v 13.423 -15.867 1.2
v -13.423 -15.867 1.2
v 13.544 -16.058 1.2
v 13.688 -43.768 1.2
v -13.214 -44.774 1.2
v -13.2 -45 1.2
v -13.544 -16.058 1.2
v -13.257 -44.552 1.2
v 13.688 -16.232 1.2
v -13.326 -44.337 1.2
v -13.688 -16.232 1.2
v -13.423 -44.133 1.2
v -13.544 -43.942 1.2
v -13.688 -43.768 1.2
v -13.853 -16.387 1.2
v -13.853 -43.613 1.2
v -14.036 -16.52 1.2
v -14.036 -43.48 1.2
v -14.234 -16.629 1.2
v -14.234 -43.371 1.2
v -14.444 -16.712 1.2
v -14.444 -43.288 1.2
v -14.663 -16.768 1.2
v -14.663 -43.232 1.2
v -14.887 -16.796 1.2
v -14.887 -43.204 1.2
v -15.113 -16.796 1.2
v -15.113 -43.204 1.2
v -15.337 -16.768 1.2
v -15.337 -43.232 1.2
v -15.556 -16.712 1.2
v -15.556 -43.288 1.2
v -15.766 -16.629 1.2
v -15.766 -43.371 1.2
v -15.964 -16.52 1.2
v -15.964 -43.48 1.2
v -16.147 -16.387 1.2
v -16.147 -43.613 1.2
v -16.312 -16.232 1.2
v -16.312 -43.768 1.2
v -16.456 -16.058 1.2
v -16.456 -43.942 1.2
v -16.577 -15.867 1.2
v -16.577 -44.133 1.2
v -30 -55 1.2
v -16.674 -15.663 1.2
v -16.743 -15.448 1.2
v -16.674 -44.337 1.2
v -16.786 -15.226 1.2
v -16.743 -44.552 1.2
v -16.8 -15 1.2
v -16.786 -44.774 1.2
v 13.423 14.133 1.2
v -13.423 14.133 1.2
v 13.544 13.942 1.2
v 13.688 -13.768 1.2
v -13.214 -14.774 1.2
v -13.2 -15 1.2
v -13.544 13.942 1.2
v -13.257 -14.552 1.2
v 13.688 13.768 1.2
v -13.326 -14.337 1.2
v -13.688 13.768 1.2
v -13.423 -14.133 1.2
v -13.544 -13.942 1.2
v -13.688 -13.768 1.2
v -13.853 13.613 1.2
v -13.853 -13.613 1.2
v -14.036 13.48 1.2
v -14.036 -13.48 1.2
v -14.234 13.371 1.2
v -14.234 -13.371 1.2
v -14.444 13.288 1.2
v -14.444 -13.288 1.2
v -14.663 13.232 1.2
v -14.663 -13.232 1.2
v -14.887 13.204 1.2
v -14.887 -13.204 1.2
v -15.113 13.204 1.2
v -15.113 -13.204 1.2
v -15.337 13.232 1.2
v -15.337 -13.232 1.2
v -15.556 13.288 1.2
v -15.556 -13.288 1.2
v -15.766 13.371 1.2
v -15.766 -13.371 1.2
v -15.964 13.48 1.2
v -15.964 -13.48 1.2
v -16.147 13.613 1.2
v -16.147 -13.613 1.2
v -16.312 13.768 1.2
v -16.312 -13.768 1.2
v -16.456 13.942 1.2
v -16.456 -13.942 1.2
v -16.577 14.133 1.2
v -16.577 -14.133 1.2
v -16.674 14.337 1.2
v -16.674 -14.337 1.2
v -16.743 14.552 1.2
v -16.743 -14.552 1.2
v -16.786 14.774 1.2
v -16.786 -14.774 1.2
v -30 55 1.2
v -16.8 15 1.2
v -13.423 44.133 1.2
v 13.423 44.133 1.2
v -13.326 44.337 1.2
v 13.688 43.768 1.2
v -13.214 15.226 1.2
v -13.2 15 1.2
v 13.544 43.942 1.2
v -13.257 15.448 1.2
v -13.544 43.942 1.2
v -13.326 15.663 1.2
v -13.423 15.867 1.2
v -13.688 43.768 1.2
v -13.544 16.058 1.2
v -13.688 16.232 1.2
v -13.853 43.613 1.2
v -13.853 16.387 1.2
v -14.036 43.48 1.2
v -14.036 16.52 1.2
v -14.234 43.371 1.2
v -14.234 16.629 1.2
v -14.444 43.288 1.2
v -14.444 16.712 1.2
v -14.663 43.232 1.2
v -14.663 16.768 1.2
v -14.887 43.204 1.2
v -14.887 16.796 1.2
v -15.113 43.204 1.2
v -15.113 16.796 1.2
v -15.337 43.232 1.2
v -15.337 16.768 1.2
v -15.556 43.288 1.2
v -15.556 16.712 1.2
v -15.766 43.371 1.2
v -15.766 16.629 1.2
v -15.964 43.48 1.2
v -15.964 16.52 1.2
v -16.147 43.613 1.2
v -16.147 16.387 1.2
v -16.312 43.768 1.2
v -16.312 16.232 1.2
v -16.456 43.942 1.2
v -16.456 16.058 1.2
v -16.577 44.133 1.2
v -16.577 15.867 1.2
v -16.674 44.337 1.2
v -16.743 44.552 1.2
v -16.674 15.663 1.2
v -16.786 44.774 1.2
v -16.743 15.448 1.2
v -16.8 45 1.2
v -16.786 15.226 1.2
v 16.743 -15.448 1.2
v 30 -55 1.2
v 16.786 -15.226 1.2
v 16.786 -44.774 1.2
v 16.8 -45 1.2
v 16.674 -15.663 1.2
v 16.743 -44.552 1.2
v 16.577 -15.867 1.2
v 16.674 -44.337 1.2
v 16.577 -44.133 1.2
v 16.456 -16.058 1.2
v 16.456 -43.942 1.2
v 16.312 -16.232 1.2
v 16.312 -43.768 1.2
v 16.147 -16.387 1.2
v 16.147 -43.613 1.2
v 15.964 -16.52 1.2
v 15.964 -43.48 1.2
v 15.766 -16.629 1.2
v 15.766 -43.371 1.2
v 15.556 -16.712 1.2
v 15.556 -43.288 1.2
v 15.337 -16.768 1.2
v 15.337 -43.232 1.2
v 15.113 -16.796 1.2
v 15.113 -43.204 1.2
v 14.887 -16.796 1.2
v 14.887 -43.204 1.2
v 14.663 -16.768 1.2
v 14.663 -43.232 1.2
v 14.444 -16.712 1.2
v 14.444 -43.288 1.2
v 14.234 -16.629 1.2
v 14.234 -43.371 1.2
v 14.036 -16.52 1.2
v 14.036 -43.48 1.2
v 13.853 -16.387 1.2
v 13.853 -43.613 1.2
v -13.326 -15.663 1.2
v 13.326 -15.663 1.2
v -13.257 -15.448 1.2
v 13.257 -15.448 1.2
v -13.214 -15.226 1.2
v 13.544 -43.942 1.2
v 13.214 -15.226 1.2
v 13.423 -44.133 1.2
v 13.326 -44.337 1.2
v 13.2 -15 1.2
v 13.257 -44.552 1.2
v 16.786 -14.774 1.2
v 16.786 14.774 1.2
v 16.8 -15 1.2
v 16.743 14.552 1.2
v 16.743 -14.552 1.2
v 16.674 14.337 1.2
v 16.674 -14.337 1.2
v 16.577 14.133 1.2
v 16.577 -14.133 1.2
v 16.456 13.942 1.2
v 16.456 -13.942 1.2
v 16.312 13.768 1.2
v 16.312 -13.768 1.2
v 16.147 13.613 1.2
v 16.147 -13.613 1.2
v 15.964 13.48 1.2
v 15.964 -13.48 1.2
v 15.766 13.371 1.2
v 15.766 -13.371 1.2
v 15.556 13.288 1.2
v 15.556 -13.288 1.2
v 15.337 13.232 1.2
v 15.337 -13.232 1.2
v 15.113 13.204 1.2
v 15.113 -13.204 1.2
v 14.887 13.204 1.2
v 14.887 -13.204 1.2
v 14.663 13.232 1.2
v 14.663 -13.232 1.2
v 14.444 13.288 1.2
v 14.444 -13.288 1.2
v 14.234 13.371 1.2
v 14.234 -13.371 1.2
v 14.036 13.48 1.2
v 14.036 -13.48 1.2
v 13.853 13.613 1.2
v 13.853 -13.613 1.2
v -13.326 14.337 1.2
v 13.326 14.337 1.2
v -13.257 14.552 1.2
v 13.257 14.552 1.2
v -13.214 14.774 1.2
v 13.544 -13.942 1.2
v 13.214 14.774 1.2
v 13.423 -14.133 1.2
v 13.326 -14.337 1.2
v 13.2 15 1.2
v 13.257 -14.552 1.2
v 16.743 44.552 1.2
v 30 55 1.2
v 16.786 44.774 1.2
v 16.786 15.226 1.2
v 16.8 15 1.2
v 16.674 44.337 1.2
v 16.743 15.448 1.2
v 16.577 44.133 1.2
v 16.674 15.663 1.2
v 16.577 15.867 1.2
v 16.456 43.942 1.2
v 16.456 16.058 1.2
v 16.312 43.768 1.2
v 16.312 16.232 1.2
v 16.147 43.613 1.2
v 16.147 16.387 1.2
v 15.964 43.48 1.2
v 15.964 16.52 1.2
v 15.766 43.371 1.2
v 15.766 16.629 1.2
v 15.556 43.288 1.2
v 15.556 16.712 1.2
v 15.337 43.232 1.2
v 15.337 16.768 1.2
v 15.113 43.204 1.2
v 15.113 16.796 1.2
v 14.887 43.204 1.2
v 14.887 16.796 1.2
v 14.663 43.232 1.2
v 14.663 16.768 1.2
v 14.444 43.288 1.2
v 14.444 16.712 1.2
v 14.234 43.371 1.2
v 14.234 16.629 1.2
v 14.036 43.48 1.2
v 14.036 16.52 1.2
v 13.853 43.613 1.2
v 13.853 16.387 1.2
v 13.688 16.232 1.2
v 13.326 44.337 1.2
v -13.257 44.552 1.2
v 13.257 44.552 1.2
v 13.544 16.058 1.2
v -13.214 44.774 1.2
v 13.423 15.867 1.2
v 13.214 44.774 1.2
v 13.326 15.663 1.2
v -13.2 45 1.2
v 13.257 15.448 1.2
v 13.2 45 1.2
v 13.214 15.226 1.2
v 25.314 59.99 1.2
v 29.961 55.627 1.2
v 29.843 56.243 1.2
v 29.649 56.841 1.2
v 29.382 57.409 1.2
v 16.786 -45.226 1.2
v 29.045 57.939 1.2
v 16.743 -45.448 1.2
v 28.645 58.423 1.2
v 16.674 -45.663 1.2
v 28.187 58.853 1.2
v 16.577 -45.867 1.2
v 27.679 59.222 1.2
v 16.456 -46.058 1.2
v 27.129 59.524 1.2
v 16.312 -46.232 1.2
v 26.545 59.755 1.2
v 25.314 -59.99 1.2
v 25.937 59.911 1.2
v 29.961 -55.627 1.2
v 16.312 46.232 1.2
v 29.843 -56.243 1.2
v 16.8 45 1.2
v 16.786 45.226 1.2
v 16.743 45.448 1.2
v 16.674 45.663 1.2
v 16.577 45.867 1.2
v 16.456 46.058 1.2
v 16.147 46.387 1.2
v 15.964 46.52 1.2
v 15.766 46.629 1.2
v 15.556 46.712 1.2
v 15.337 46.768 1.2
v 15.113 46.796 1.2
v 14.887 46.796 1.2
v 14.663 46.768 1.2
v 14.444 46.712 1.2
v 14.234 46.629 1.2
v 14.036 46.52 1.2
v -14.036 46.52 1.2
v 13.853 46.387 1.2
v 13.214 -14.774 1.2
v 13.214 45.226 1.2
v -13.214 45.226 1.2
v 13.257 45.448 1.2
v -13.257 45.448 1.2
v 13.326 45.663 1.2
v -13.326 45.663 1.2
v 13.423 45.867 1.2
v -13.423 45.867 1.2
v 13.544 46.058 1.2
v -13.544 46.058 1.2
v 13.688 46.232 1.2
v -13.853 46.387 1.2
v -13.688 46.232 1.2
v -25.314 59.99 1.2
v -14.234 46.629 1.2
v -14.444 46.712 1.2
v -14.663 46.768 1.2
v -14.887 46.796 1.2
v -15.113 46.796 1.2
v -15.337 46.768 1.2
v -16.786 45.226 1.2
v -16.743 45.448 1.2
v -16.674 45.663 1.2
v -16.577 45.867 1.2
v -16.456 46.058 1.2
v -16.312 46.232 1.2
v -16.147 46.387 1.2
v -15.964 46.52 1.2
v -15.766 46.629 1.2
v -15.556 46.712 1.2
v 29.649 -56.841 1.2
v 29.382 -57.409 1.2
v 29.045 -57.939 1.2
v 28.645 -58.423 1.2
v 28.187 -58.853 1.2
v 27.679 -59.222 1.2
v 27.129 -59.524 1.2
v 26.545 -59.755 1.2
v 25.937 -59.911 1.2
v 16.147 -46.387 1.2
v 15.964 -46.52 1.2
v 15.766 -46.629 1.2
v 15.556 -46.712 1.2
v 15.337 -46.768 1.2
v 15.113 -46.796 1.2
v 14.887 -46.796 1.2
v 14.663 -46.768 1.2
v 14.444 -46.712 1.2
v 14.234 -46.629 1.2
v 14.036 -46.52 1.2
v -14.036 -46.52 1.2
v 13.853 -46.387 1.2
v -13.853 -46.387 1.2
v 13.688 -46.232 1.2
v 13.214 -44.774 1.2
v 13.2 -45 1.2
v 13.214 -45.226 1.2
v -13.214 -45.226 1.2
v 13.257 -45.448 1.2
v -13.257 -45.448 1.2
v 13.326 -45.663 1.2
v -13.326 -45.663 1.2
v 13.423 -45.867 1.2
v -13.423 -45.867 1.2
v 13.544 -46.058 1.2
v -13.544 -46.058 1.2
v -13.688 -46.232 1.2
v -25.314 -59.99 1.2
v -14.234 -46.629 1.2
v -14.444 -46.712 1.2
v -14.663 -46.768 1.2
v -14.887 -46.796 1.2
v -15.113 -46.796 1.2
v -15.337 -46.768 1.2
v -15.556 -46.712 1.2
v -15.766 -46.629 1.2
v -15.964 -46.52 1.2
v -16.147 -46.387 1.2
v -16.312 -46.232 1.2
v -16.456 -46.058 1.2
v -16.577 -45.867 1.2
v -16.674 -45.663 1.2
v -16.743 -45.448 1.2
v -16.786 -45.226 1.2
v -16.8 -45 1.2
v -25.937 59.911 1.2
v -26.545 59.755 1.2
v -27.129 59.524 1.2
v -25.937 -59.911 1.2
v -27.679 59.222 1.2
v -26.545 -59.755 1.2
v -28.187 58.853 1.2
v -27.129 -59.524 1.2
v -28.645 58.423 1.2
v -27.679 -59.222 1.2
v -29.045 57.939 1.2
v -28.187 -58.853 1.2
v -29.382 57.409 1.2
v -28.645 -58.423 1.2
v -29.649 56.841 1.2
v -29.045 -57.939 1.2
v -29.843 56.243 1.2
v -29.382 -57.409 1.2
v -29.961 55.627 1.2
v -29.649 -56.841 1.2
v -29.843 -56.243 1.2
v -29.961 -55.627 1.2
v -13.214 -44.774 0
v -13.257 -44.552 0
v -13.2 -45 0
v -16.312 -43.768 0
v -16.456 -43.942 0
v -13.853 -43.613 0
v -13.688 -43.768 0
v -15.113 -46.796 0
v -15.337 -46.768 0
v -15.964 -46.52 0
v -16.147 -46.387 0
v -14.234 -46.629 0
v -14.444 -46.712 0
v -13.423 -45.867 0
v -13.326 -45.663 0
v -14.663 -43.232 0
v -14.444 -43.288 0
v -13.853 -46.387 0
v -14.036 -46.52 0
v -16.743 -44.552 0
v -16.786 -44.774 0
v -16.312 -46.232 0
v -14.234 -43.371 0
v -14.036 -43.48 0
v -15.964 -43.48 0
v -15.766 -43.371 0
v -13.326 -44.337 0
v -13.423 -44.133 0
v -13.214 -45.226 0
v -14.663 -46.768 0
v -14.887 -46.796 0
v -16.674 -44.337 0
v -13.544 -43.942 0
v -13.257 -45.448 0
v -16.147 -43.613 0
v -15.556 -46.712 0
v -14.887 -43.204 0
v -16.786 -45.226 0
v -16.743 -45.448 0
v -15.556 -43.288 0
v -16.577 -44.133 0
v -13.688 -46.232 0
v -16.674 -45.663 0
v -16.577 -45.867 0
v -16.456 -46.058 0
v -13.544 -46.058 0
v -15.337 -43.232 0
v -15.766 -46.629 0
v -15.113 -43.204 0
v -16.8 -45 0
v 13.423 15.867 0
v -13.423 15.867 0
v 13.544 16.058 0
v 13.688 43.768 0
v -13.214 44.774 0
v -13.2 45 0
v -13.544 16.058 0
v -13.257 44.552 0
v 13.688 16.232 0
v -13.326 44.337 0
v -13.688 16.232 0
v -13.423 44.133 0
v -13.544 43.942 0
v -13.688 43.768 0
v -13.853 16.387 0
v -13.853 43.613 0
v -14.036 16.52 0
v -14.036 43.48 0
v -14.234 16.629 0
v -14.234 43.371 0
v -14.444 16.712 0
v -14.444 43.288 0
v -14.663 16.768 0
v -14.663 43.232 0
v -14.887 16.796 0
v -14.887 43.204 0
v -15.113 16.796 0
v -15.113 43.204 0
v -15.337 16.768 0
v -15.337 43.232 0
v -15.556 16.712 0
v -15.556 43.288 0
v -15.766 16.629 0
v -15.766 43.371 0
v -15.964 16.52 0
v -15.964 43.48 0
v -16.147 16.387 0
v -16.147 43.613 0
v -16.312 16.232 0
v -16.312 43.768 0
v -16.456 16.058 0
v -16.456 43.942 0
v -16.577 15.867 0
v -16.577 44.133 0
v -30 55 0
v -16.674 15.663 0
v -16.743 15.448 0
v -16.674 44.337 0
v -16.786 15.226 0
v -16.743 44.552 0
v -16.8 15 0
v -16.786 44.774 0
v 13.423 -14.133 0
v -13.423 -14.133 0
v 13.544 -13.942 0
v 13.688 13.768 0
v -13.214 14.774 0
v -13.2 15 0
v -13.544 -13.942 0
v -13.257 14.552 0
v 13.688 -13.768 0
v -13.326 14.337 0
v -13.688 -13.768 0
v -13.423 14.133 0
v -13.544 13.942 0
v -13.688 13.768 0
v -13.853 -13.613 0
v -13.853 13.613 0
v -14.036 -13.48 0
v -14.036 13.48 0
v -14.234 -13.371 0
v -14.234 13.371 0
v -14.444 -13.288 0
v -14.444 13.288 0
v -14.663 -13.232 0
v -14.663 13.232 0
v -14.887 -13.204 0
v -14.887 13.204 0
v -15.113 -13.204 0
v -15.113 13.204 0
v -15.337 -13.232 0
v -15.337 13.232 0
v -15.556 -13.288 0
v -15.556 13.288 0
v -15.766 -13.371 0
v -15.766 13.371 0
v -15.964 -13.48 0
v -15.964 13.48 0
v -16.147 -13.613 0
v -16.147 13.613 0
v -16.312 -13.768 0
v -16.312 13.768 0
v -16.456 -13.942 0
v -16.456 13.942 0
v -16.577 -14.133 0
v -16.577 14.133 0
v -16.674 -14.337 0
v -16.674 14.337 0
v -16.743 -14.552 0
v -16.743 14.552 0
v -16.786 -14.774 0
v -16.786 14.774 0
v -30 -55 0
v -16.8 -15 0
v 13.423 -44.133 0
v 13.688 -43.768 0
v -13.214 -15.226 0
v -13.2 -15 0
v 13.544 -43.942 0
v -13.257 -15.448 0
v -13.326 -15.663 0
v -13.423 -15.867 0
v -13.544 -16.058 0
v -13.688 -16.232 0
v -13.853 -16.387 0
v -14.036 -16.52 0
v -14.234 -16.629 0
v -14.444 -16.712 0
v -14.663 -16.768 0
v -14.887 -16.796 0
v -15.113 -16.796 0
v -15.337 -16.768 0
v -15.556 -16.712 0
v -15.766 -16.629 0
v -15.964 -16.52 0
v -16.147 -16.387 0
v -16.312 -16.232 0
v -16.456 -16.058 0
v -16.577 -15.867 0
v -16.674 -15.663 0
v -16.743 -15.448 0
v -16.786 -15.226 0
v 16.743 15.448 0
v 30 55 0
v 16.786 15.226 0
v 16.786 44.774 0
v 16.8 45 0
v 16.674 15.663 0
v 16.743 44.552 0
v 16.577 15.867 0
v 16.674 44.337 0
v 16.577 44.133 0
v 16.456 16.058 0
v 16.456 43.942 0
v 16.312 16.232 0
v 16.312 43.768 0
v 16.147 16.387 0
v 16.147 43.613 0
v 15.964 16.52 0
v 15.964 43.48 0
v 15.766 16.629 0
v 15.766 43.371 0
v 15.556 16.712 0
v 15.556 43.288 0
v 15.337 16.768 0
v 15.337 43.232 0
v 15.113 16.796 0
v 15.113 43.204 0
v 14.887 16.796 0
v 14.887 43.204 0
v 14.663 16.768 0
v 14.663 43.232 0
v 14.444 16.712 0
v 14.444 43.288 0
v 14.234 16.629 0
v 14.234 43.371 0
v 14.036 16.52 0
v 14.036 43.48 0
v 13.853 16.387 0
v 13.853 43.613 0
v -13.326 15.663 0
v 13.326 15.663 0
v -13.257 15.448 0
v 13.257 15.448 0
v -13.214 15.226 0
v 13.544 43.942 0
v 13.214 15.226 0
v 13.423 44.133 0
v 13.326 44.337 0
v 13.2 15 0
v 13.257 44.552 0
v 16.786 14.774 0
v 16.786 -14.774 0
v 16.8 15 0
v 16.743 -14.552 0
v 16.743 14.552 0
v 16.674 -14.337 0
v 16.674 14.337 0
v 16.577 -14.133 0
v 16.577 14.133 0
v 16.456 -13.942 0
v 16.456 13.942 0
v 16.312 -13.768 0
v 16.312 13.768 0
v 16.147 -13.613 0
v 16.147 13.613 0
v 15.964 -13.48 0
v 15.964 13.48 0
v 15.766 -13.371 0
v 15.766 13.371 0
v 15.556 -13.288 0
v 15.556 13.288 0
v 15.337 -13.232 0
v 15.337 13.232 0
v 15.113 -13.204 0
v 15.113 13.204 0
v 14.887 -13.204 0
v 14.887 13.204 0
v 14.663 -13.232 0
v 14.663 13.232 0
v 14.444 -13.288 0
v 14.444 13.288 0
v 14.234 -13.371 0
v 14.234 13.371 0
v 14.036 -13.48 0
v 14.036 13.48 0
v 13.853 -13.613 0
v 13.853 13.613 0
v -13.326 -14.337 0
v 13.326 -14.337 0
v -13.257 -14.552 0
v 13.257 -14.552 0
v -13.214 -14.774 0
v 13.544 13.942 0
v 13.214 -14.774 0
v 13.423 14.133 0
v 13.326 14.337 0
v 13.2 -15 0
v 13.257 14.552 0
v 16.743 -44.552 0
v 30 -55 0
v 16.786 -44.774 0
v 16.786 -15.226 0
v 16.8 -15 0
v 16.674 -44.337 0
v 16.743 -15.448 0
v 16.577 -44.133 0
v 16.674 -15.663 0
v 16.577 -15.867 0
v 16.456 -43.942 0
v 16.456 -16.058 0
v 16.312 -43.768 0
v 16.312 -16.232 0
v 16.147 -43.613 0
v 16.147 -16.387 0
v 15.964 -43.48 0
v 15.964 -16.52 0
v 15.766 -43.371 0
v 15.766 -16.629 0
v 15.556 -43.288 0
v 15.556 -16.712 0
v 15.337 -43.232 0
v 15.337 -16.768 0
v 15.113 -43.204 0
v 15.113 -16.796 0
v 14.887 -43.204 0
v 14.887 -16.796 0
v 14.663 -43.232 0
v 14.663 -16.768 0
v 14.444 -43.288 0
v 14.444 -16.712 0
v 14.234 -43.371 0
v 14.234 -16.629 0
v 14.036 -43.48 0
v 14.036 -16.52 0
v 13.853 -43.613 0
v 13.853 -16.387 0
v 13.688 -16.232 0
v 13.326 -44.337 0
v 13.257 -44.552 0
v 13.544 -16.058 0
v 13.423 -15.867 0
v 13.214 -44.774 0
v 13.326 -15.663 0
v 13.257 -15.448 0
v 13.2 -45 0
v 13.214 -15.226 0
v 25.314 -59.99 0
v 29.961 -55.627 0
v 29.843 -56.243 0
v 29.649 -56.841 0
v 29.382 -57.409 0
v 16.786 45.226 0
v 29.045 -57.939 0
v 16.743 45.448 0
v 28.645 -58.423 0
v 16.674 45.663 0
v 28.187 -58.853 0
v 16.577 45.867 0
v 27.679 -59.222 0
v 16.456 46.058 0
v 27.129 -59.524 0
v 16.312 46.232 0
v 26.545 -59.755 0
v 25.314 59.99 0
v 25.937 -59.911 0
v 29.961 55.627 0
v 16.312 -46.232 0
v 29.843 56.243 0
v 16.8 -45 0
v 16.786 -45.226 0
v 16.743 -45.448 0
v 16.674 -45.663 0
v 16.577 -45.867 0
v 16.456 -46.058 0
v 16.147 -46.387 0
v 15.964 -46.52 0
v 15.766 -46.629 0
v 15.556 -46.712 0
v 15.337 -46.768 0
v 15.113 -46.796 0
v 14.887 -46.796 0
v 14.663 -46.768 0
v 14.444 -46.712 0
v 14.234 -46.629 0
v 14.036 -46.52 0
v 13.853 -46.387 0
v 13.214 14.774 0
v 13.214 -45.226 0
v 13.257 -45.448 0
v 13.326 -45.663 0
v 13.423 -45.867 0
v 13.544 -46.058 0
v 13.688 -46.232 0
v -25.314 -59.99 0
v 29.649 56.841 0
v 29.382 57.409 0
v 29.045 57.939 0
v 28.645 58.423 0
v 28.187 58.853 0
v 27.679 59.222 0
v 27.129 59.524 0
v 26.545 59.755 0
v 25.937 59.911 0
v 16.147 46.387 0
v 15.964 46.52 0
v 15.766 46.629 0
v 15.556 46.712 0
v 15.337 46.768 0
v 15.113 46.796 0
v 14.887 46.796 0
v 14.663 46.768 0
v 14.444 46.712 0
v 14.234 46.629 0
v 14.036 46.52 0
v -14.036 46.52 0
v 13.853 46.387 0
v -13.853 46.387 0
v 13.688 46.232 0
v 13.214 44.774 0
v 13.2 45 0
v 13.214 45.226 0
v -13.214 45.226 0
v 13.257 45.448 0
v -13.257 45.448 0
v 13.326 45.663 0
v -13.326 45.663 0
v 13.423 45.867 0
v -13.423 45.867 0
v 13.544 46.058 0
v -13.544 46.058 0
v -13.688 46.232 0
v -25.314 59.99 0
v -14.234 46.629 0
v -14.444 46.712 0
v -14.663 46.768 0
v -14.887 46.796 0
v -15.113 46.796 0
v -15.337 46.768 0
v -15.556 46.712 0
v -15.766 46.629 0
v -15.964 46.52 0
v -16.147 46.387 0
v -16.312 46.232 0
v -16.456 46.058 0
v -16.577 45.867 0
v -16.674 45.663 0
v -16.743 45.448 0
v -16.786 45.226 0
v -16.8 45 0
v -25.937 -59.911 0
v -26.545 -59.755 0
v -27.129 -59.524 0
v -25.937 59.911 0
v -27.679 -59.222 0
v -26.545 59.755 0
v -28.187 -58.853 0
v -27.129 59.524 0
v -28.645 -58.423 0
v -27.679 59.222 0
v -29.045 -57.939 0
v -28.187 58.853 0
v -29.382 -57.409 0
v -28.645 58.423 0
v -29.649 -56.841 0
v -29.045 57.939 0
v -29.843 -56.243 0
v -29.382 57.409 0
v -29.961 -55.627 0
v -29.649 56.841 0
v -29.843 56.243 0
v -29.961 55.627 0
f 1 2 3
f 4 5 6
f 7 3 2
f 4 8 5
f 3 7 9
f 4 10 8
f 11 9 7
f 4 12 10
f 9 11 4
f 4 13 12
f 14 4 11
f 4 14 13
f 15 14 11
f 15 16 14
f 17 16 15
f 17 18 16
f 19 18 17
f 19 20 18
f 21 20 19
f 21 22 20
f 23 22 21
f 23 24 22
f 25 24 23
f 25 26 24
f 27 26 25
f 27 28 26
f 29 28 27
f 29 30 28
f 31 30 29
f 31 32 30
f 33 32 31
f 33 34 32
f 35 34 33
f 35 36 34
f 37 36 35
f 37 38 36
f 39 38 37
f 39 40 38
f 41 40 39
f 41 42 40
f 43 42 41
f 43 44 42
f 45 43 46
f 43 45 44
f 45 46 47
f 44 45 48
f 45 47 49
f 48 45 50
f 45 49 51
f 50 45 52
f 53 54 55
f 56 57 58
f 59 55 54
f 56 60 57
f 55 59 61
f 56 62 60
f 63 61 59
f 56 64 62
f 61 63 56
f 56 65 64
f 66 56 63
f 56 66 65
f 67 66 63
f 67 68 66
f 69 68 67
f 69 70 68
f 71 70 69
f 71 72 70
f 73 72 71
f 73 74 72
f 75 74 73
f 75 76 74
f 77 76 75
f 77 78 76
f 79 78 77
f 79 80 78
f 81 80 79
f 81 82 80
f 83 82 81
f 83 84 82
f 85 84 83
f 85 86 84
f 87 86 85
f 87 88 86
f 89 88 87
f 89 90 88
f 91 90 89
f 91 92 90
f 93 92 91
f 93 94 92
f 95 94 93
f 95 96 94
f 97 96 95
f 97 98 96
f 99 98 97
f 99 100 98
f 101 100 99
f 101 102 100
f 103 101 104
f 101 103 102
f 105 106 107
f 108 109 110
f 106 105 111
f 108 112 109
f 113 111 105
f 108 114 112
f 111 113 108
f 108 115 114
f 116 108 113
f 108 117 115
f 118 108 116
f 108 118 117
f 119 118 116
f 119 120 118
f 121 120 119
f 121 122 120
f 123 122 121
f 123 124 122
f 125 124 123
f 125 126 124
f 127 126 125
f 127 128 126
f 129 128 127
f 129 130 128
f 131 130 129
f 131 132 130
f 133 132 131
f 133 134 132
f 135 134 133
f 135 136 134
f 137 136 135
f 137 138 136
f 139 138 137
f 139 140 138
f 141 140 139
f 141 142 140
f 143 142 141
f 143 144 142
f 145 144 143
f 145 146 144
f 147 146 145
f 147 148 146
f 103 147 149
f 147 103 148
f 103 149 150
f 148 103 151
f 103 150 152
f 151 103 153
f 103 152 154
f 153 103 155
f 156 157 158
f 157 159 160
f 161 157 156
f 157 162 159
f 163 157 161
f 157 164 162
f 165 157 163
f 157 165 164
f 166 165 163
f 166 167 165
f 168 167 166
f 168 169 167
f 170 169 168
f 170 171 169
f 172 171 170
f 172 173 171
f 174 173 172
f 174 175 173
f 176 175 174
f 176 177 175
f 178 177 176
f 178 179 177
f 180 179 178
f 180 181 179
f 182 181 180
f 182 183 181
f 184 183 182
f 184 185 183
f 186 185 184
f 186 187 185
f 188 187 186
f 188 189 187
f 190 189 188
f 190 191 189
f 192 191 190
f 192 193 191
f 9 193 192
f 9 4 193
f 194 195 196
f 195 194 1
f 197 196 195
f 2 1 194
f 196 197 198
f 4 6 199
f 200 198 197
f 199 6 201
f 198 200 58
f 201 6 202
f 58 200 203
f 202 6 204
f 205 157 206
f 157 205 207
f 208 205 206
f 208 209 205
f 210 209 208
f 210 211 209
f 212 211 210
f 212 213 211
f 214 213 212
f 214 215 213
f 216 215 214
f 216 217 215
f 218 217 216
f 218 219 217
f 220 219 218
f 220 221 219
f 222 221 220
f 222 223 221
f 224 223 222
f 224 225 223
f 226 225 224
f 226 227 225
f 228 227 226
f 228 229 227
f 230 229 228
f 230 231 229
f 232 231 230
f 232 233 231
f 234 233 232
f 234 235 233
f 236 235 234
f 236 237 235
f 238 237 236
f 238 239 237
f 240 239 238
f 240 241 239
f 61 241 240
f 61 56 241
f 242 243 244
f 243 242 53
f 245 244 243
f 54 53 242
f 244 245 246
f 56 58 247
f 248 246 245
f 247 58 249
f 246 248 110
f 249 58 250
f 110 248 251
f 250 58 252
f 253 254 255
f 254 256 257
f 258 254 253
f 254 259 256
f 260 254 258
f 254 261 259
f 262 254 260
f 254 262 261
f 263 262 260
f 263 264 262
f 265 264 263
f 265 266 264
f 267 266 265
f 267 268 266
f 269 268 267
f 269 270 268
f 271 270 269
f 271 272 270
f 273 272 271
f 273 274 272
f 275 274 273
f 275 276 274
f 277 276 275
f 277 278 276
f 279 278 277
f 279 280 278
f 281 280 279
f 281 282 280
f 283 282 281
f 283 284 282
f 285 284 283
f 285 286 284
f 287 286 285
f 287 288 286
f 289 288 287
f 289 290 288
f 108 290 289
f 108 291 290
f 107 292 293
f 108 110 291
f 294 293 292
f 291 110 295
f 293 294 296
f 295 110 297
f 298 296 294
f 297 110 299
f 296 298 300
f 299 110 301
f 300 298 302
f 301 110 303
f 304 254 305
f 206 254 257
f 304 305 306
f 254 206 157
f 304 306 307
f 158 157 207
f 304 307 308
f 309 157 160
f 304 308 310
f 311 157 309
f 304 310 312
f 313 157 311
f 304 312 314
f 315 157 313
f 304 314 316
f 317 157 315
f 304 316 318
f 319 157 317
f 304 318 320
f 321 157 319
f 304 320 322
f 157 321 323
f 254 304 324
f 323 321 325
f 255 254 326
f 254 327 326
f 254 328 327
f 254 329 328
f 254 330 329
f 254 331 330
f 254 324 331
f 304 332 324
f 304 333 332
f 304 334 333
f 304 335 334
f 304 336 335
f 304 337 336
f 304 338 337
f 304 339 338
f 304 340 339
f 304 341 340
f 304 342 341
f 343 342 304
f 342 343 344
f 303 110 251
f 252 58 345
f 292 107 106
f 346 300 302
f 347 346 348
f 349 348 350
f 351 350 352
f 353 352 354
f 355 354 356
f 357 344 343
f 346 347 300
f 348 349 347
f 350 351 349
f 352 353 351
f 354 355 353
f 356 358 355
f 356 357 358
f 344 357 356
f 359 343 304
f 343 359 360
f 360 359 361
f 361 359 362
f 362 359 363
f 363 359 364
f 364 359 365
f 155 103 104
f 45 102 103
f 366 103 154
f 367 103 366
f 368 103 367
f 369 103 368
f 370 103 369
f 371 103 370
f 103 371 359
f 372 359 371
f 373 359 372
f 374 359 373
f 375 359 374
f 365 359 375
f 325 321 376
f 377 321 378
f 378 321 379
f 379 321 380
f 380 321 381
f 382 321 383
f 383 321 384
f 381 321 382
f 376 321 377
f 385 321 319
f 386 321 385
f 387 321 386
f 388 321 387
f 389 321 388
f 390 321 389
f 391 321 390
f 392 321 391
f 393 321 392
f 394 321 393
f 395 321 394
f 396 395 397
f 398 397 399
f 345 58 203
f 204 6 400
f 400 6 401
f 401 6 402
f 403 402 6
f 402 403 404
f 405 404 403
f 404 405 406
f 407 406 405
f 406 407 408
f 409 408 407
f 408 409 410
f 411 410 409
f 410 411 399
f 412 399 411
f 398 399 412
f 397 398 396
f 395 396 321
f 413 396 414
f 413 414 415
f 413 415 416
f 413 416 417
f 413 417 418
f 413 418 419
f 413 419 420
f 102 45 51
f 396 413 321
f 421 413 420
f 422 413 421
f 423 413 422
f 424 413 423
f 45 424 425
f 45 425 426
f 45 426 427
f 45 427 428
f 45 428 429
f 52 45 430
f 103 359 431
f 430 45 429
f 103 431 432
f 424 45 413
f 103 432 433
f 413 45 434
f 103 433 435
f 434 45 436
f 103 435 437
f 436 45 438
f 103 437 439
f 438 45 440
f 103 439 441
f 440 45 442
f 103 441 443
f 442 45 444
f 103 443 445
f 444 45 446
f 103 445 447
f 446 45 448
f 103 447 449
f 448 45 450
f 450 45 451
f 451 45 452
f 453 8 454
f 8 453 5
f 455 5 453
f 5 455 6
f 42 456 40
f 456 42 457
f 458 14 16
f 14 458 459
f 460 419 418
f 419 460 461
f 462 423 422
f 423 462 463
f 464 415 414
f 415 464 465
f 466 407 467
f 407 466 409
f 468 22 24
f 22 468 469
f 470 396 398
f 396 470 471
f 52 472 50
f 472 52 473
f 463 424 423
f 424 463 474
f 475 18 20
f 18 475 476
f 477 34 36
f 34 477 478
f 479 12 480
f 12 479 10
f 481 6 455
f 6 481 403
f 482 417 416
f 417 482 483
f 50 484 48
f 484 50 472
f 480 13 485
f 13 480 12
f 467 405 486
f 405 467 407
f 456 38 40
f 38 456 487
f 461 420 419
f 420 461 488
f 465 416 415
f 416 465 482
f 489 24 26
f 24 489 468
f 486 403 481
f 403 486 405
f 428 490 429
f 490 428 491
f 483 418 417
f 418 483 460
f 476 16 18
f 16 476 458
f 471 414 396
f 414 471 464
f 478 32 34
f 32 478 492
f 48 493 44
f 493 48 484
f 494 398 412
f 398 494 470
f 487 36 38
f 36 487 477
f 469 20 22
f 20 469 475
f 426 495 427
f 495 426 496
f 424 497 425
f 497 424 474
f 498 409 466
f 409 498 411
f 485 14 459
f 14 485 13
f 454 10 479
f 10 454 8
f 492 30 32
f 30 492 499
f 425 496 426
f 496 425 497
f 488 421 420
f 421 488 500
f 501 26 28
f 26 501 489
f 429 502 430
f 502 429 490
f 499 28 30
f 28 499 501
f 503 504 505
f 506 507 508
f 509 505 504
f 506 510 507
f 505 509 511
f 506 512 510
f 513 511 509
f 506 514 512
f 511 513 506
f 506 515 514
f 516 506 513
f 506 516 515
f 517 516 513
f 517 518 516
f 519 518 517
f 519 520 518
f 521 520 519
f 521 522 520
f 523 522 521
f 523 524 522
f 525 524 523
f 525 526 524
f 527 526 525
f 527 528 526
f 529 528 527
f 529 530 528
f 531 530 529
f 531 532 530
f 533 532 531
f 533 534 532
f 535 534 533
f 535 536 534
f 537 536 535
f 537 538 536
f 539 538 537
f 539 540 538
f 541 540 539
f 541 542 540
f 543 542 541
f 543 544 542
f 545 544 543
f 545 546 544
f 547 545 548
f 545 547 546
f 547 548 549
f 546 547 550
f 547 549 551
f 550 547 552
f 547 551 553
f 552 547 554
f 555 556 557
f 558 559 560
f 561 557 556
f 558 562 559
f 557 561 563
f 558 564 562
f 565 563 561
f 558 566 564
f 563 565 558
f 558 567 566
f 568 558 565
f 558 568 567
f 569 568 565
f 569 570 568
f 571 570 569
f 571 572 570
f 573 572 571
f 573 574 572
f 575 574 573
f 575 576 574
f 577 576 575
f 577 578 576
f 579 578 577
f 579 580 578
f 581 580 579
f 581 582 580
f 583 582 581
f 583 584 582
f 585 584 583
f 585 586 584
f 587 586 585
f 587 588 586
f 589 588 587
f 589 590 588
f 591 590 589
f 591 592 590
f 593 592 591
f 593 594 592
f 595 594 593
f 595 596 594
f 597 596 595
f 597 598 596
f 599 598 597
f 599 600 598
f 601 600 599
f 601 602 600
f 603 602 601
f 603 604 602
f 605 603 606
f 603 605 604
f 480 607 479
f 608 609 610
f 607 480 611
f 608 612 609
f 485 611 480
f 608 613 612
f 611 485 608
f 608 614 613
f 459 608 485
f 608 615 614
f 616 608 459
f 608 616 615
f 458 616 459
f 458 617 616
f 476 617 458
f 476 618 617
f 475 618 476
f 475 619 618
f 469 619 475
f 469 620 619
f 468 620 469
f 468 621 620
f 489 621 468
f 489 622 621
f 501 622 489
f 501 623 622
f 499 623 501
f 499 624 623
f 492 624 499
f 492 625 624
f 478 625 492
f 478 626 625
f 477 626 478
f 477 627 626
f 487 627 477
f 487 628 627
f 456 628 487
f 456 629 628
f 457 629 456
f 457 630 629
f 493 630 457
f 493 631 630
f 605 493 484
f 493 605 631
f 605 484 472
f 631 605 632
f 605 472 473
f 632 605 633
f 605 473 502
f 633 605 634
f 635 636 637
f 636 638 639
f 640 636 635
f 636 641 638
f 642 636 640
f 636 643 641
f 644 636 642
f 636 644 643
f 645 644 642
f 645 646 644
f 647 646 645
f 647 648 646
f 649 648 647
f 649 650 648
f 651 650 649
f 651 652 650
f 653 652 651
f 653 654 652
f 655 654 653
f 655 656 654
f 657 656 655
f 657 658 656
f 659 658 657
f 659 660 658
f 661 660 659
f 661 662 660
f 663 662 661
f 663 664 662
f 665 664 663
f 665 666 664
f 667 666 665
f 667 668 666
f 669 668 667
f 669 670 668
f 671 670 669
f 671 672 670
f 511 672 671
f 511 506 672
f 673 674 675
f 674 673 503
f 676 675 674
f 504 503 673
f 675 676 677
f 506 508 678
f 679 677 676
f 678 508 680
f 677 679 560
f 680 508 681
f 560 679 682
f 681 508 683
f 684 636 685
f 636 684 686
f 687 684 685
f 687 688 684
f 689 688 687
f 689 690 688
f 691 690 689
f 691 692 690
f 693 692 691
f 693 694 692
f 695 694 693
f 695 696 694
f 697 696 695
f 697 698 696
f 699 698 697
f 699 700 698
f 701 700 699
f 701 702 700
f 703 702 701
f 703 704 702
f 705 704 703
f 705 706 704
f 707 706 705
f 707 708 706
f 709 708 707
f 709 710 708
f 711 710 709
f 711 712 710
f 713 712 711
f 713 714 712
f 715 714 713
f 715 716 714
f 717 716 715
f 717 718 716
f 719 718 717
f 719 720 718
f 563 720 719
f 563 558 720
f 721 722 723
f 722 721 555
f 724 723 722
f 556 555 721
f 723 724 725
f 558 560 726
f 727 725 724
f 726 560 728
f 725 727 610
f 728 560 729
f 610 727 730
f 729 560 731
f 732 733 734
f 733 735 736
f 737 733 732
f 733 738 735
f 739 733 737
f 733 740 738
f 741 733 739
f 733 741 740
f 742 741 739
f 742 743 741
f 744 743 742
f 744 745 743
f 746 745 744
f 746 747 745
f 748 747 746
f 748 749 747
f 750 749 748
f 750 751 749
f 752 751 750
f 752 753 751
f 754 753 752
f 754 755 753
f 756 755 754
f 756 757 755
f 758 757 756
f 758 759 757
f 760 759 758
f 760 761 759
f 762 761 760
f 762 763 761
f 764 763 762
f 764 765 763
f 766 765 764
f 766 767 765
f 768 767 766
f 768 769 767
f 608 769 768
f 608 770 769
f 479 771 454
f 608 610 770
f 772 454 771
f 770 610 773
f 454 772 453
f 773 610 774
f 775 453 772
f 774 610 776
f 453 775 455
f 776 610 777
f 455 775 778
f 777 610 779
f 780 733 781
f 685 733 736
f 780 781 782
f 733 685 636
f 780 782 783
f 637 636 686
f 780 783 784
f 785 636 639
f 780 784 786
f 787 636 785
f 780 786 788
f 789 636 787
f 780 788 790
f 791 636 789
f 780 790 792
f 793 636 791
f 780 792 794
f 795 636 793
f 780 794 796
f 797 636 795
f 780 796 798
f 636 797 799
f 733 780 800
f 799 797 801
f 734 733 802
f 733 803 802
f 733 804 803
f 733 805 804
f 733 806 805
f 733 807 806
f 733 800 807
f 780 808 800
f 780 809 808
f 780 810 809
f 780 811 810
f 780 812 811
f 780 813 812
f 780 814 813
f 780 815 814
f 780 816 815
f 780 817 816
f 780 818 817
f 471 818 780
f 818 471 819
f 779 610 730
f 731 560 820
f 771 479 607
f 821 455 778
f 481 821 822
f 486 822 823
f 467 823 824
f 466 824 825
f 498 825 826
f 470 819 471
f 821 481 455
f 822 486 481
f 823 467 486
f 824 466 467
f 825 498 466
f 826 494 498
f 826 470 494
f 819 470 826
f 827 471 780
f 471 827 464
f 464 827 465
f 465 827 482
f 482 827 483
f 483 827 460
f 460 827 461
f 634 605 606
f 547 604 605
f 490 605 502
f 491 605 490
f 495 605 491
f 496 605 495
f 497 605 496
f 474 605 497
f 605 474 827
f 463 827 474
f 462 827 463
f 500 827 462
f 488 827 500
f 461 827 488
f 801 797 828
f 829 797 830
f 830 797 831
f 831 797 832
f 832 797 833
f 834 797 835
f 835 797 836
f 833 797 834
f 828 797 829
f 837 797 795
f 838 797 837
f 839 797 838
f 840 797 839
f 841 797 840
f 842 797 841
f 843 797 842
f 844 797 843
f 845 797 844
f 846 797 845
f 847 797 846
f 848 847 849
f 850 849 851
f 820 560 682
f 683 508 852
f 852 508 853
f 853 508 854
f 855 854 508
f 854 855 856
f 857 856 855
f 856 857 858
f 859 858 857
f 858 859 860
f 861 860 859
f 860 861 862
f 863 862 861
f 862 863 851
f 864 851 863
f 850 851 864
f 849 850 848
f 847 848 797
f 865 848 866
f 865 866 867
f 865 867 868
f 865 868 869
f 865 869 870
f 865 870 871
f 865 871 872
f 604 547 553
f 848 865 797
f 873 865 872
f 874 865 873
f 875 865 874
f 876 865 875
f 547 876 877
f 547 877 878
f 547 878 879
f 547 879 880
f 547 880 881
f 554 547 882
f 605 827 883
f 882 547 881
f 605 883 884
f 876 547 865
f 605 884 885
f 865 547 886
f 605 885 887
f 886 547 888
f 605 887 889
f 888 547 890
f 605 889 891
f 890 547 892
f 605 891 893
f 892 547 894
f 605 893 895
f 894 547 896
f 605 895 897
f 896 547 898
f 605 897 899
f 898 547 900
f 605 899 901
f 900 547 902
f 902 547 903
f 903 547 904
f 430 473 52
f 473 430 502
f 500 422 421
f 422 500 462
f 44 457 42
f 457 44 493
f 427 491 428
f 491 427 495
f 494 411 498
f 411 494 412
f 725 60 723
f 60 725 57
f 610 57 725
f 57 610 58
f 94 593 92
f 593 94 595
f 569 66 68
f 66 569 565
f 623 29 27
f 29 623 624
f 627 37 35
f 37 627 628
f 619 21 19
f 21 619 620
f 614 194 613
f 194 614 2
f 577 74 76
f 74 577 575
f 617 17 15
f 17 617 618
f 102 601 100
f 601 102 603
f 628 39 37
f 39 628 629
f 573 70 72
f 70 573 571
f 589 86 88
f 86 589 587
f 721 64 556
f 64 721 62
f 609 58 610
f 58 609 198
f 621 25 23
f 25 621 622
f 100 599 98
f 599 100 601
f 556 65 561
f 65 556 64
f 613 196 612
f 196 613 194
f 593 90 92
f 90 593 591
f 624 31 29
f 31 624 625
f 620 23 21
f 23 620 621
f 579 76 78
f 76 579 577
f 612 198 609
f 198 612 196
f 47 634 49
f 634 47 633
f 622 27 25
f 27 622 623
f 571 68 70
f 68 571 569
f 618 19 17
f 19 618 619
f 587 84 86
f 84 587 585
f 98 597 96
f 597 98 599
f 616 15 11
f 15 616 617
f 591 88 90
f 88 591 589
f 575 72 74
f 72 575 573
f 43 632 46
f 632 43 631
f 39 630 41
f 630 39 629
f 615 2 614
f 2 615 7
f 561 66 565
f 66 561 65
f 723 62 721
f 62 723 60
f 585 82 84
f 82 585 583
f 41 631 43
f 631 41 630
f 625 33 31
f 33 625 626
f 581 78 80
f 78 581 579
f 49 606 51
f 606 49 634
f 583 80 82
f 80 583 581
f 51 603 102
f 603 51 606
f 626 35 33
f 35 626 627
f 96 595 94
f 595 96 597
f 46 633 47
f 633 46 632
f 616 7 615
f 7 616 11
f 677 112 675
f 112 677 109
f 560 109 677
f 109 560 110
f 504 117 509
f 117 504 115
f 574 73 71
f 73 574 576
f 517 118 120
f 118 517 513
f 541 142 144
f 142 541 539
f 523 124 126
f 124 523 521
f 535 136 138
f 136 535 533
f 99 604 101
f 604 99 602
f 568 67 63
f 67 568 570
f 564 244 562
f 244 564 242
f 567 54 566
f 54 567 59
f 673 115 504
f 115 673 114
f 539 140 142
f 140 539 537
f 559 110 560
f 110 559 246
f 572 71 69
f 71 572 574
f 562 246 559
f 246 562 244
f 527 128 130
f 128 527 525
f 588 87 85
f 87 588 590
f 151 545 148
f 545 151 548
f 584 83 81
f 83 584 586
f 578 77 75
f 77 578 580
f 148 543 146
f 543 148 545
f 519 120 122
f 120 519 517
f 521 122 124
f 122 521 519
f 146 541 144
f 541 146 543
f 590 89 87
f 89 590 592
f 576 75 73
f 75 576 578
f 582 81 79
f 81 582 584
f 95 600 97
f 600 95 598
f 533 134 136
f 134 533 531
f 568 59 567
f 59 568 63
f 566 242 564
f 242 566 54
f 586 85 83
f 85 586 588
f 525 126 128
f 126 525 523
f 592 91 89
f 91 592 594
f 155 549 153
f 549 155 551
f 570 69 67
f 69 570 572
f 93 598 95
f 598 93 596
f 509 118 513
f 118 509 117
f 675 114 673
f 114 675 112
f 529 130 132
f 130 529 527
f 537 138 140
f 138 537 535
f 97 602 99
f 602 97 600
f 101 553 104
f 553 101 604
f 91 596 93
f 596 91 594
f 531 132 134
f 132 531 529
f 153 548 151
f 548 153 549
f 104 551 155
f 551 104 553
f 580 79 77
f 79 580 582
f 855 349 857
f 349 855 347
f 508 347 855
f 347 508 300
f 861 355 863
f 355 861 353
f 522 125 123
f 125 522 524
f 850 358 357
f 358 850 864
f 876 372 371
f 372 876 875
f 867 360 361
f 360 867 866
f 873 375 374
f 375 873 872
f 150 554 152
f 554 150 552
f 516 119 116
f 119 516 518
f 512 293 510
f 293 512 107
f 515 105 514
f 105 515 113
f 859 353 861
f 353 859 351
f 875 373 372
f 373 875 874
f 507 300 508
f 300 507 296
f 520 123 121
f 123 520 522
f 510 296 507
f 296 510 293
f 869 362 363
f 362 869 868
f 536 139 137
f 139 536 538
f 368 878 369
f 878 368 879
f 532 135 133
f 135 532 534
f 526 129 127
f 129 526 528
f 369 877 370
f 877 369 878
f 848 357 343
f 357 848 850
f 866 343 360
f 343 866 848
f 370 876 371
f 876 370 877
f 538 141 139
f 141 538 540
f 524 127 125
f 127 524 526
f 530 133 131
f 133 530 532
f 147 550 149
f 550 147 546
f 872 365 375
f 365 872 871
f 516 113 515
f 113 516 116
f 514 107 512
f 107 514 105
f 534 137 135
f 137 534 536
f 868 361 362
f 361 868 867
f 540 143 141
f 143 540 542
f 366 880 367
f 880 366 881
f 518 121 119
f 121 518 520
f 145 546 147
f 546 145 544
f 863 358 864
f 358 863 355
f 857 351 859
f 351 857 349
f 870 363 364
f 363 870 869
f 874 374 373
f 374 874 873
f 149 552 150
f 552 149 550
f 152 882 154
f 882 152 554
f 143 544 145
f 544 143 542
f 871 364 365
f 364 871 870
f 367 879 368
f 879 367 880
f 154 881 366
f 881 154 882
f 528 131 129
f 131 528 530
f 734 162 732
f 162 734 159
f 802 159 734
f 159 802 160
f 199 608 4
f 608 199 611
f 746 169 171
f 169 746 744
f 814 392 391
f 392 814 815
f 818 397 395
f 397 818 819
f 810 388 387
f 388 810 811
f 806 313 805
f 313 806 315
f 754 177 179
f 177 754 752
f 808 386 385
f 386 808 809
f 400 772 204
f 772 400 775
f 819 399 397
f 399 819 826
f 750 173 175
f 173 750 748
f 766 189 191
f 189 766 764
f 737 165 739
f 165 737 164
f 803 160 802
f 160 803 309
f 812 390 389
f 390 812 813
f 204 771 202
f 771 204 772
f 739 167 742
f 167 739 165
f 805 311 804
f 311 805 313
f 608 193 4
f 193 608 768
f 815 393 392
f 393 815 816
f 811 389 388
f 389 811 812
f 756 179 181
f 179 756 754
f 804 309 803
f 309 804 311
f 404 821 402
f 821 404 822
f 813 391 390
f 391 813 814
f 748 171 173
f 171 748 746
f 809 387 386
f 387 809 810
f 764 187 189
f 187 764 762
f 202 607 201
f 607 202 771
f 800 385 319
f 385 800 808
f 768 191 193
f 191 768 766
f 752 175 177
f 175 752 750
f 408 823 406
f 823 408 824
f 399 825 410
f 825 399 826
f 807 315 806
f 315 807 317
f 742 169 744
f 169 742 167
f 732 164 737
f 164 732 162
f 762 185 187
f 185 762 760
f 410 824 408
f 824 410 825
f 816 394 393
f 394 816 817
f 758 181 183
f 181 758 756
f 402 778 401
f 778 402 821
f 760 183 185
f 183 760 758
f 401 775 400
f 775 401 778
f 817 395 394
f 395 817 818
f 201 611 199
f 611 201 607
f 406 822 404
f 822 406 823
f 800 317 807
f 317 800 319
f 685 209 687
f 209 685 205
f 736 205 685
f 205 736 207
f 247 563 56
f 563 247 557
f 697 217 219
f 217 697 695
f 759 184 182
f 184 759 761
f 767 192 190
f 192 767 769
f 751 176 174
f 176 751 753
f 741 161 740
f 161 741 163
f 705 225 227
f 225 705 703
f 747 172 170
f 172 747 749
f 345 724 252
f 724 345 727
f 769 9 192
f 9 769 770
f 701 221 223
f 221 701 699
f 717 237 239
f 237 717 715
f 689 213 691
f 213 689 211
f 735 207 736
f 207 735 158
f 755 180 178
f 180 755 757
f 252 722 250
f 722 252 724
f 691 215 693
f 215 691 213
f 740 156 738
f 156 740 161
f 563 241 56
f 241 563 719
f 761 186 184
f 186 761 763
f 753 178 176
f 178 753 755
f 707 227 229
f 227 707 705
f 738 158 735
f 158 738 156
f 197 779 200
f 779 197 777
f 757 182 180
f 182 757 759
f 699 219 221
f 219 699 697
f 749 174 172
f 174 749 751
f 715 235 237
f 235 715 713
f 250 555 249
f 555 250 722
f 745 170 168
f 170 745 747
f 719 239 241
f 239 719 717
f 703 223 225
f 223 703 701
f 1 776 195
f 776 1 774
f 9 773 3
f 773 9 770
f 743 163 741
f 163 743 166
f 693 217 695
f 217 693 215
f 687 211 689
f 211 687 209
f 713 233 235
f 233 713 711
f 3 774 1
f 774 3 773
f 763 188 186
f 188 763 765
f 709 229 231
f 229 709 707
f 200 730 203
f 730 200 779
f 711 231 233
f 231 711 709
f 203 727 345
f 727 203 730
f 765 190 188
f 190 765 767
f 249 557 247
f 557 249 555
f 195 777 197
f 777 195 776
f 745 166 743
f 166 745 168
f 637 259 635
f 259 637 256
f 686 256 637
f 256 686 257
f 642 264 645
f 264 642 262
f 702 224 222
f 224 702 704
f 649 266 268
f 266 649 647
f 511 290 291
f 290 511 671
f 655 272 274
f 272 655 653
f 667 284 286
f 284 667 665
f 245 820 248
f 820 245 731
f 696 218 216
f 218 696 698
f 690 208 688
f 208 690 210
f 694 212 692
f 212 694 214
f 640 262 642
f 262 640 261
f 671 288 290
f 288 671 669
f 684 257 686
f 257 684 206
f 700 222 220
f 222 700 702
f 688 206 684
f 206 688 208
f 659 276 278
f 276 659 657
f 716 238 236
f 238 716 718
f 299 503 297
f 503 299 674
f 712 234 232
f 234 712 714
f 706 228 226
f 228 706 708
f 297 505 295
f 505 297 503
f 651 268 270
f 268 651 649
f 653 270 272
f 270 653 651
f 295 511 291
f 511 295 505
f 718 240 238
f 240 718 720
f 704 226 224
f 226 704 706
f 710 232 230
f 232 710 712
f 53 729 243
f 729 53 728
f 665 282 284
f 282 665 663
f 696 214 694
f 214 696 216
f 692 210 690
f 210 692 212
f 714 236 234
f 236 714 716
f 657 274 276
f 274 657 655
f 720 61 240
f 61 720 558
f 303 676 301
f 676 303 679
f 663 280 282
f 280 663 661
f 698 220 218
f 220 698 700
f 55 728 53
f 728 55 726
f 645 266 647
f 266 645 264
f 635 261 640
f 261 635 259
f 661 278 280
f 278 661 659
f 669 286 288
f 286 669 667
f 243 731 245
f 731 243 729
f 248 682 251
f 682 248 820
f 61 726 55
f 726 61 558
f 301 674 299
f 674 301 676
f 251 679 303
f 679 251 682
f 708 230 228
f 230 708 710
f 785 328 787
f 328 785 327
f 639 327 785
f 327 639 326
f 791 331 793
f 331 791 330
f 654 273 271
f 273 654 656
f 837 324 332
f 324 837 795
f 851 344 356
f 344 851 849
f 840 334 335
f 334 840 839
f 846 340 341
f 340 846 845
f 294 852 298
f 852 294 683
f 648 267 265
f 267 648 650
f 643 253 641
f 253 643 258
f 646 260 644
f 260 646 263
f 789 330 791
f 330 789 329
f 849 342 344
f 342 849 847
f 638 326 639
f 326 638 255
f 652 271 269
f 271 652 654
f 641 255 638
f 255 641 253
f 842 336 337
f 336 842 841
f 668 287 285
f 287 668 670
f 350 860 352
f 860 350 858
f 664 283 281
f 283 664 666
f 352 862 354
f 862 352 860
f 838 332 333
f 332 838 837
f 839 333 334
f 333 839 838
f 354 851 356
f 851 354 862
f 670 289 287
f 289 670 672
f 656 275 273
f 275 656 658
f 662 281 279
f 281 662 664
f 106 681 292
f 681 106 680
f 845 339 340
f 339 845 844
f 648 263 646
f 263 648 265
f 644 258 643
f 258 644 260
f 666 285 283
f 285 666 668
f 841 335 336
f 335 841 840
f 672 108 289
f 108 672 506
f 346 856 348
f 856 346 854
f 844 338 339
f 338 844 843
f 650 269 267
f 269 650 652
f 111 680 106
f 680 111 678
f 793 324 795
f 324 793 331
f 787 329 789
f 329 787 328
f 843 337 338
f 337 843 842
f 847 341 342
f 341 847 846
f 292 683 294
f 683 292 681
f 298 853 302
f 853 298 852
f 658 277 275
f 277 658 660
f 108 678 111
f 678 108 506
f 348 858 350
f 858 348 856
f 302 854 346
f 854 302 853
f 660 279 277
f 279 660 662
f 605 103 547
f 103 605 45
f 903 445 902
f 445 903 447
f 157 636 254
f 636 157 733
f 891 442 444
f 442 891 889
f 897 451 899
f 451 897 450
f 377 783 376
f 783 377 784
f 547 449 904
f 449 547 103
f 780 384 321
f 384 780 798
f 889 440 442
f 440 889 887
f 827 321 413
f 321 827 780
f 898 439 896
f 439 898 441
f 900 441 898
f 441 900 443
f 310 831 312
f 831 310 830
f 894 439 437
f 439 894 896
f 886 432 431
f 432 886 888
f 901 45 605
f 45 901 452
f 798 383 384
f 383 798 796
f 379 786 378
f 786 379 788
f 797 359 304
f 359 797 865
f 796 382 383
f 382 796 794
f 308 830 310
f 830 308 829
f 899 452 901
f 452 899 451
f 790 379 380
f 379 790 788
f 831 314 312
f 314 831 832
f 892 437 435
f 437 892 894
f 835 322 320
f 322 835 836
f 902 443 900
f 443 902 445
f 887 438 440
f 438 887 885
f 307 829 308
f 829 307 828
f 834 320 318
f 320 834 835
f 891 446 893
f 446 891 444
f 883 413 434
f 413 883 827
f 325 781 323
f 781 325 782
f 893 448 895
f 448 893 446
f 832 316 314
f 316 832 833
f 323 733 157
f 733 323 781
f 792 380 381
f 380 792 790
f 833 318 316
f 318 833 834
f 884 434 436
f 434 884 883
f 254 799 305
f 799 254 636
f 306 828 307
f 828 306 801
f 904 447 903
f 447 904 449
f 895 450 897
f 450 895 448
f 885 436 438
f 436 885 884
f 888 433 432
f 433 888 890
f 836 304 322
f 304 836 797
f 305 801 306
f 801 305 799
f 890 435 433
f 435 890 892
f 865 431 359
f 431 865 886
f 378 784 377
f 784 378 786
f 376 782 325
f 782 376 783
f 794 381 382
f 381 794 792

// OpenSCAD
$fn = 50;


difference() {
	union() {
		hull() {
			translate(v = [-25.0000000000, 55.0000000000, 0]) {
				cylinder(h = 12, r = 5);
			}
			translate(v = [25.0000000000, 55.0000000000, 0]) {
				cylinder(h = 12, r = 5);
			}
			translate(v = [-25.0000000000, -55.0000000000, 0]) {
				cylinder(h = 12, r = 5);
			}
			translate(v = [25.0000000000, -55.0000000000, 0]) {
				cylinder(h = 12, r = 5);
			}
		}
	}
	union() {
		translate(v = [0, 0, 1.2000000000]) {
			hull() {
				translate(v = [-25.0000000000, 55.0000000000, 0]) {
					cylinder(h = 10.8000000000, r = 3.8000000000);
				}
				translate(v = [25.0000000000, 55.0000000000, 0]) {
					cylinder(h = 10.8000000000, r = 3.8000000000);
				}
				translate(v = [-25.0000000000, -55.0000000000, 0]) {
					cylinder(h = 10.8000000000, r = 3.8000000000);
				}
				translate(v = [25.0000000000, -55.0000000000, 0]) {
					cylinder(h = 10.8000000000, r = 3.8000000000);
				}
			}
		}
		#translate(v = [-15.0000000000, -45.0000000000, 0]) {
			cylinder(h = 1.2000000000, r = 1.8000000000);
		}
		#translate(v = [-15.0000000000, -15.0000000000, 0]) {
			cylinder(h = 1.2000000000, r = 1.8000000000);
		}
		#translate(v = [-15.0000000000, 15.0000000000, 0]) {
			cylinder(h = 1.2000000000, r = 1.8000000000);
		}
		#translate(v = [-15.0000000000, 45.0000000000, 0]) {
			cylinder(h = 1.2000000000, r = 1.8000000000);
		}
		#translate(v = [15.0000000000, -45.0000000000, 0]) {
			cylinder(h = 1.2000000000, r = 1.8000000000);
		}
		#translate(v = [15.0000000000, -15.0000000000, 0]) {
			cylinder(h = 1.2000000000, r = 1.8000000000);
		}
		#translate(v = [15.0000000000, 15.0000000000, 0]) {
			cylinder(h = 1.2000000000, r = 1.8000000000);
		}
		#translate(v = [15.0000000000, 45.0000000000, 0]) {
			cylinder(h = 1.2000000000, r = 1.8000000000);
		}
		translate(v = [-250.0000000000, -250.0000000000, 1.2000000000]) {
			cube(size = [500, 500, 500]);
		}
		translate(v = [-250.0000000000, -250.0000000000, 1.2000000000]) {
			cube(size = [500, 500, 500]);
		}
		translate(v = [-250.0000000000, -250.0000000000, 1.2000000000]) {
			cube(size = [500, 500, 500]);
		}
	}
}
